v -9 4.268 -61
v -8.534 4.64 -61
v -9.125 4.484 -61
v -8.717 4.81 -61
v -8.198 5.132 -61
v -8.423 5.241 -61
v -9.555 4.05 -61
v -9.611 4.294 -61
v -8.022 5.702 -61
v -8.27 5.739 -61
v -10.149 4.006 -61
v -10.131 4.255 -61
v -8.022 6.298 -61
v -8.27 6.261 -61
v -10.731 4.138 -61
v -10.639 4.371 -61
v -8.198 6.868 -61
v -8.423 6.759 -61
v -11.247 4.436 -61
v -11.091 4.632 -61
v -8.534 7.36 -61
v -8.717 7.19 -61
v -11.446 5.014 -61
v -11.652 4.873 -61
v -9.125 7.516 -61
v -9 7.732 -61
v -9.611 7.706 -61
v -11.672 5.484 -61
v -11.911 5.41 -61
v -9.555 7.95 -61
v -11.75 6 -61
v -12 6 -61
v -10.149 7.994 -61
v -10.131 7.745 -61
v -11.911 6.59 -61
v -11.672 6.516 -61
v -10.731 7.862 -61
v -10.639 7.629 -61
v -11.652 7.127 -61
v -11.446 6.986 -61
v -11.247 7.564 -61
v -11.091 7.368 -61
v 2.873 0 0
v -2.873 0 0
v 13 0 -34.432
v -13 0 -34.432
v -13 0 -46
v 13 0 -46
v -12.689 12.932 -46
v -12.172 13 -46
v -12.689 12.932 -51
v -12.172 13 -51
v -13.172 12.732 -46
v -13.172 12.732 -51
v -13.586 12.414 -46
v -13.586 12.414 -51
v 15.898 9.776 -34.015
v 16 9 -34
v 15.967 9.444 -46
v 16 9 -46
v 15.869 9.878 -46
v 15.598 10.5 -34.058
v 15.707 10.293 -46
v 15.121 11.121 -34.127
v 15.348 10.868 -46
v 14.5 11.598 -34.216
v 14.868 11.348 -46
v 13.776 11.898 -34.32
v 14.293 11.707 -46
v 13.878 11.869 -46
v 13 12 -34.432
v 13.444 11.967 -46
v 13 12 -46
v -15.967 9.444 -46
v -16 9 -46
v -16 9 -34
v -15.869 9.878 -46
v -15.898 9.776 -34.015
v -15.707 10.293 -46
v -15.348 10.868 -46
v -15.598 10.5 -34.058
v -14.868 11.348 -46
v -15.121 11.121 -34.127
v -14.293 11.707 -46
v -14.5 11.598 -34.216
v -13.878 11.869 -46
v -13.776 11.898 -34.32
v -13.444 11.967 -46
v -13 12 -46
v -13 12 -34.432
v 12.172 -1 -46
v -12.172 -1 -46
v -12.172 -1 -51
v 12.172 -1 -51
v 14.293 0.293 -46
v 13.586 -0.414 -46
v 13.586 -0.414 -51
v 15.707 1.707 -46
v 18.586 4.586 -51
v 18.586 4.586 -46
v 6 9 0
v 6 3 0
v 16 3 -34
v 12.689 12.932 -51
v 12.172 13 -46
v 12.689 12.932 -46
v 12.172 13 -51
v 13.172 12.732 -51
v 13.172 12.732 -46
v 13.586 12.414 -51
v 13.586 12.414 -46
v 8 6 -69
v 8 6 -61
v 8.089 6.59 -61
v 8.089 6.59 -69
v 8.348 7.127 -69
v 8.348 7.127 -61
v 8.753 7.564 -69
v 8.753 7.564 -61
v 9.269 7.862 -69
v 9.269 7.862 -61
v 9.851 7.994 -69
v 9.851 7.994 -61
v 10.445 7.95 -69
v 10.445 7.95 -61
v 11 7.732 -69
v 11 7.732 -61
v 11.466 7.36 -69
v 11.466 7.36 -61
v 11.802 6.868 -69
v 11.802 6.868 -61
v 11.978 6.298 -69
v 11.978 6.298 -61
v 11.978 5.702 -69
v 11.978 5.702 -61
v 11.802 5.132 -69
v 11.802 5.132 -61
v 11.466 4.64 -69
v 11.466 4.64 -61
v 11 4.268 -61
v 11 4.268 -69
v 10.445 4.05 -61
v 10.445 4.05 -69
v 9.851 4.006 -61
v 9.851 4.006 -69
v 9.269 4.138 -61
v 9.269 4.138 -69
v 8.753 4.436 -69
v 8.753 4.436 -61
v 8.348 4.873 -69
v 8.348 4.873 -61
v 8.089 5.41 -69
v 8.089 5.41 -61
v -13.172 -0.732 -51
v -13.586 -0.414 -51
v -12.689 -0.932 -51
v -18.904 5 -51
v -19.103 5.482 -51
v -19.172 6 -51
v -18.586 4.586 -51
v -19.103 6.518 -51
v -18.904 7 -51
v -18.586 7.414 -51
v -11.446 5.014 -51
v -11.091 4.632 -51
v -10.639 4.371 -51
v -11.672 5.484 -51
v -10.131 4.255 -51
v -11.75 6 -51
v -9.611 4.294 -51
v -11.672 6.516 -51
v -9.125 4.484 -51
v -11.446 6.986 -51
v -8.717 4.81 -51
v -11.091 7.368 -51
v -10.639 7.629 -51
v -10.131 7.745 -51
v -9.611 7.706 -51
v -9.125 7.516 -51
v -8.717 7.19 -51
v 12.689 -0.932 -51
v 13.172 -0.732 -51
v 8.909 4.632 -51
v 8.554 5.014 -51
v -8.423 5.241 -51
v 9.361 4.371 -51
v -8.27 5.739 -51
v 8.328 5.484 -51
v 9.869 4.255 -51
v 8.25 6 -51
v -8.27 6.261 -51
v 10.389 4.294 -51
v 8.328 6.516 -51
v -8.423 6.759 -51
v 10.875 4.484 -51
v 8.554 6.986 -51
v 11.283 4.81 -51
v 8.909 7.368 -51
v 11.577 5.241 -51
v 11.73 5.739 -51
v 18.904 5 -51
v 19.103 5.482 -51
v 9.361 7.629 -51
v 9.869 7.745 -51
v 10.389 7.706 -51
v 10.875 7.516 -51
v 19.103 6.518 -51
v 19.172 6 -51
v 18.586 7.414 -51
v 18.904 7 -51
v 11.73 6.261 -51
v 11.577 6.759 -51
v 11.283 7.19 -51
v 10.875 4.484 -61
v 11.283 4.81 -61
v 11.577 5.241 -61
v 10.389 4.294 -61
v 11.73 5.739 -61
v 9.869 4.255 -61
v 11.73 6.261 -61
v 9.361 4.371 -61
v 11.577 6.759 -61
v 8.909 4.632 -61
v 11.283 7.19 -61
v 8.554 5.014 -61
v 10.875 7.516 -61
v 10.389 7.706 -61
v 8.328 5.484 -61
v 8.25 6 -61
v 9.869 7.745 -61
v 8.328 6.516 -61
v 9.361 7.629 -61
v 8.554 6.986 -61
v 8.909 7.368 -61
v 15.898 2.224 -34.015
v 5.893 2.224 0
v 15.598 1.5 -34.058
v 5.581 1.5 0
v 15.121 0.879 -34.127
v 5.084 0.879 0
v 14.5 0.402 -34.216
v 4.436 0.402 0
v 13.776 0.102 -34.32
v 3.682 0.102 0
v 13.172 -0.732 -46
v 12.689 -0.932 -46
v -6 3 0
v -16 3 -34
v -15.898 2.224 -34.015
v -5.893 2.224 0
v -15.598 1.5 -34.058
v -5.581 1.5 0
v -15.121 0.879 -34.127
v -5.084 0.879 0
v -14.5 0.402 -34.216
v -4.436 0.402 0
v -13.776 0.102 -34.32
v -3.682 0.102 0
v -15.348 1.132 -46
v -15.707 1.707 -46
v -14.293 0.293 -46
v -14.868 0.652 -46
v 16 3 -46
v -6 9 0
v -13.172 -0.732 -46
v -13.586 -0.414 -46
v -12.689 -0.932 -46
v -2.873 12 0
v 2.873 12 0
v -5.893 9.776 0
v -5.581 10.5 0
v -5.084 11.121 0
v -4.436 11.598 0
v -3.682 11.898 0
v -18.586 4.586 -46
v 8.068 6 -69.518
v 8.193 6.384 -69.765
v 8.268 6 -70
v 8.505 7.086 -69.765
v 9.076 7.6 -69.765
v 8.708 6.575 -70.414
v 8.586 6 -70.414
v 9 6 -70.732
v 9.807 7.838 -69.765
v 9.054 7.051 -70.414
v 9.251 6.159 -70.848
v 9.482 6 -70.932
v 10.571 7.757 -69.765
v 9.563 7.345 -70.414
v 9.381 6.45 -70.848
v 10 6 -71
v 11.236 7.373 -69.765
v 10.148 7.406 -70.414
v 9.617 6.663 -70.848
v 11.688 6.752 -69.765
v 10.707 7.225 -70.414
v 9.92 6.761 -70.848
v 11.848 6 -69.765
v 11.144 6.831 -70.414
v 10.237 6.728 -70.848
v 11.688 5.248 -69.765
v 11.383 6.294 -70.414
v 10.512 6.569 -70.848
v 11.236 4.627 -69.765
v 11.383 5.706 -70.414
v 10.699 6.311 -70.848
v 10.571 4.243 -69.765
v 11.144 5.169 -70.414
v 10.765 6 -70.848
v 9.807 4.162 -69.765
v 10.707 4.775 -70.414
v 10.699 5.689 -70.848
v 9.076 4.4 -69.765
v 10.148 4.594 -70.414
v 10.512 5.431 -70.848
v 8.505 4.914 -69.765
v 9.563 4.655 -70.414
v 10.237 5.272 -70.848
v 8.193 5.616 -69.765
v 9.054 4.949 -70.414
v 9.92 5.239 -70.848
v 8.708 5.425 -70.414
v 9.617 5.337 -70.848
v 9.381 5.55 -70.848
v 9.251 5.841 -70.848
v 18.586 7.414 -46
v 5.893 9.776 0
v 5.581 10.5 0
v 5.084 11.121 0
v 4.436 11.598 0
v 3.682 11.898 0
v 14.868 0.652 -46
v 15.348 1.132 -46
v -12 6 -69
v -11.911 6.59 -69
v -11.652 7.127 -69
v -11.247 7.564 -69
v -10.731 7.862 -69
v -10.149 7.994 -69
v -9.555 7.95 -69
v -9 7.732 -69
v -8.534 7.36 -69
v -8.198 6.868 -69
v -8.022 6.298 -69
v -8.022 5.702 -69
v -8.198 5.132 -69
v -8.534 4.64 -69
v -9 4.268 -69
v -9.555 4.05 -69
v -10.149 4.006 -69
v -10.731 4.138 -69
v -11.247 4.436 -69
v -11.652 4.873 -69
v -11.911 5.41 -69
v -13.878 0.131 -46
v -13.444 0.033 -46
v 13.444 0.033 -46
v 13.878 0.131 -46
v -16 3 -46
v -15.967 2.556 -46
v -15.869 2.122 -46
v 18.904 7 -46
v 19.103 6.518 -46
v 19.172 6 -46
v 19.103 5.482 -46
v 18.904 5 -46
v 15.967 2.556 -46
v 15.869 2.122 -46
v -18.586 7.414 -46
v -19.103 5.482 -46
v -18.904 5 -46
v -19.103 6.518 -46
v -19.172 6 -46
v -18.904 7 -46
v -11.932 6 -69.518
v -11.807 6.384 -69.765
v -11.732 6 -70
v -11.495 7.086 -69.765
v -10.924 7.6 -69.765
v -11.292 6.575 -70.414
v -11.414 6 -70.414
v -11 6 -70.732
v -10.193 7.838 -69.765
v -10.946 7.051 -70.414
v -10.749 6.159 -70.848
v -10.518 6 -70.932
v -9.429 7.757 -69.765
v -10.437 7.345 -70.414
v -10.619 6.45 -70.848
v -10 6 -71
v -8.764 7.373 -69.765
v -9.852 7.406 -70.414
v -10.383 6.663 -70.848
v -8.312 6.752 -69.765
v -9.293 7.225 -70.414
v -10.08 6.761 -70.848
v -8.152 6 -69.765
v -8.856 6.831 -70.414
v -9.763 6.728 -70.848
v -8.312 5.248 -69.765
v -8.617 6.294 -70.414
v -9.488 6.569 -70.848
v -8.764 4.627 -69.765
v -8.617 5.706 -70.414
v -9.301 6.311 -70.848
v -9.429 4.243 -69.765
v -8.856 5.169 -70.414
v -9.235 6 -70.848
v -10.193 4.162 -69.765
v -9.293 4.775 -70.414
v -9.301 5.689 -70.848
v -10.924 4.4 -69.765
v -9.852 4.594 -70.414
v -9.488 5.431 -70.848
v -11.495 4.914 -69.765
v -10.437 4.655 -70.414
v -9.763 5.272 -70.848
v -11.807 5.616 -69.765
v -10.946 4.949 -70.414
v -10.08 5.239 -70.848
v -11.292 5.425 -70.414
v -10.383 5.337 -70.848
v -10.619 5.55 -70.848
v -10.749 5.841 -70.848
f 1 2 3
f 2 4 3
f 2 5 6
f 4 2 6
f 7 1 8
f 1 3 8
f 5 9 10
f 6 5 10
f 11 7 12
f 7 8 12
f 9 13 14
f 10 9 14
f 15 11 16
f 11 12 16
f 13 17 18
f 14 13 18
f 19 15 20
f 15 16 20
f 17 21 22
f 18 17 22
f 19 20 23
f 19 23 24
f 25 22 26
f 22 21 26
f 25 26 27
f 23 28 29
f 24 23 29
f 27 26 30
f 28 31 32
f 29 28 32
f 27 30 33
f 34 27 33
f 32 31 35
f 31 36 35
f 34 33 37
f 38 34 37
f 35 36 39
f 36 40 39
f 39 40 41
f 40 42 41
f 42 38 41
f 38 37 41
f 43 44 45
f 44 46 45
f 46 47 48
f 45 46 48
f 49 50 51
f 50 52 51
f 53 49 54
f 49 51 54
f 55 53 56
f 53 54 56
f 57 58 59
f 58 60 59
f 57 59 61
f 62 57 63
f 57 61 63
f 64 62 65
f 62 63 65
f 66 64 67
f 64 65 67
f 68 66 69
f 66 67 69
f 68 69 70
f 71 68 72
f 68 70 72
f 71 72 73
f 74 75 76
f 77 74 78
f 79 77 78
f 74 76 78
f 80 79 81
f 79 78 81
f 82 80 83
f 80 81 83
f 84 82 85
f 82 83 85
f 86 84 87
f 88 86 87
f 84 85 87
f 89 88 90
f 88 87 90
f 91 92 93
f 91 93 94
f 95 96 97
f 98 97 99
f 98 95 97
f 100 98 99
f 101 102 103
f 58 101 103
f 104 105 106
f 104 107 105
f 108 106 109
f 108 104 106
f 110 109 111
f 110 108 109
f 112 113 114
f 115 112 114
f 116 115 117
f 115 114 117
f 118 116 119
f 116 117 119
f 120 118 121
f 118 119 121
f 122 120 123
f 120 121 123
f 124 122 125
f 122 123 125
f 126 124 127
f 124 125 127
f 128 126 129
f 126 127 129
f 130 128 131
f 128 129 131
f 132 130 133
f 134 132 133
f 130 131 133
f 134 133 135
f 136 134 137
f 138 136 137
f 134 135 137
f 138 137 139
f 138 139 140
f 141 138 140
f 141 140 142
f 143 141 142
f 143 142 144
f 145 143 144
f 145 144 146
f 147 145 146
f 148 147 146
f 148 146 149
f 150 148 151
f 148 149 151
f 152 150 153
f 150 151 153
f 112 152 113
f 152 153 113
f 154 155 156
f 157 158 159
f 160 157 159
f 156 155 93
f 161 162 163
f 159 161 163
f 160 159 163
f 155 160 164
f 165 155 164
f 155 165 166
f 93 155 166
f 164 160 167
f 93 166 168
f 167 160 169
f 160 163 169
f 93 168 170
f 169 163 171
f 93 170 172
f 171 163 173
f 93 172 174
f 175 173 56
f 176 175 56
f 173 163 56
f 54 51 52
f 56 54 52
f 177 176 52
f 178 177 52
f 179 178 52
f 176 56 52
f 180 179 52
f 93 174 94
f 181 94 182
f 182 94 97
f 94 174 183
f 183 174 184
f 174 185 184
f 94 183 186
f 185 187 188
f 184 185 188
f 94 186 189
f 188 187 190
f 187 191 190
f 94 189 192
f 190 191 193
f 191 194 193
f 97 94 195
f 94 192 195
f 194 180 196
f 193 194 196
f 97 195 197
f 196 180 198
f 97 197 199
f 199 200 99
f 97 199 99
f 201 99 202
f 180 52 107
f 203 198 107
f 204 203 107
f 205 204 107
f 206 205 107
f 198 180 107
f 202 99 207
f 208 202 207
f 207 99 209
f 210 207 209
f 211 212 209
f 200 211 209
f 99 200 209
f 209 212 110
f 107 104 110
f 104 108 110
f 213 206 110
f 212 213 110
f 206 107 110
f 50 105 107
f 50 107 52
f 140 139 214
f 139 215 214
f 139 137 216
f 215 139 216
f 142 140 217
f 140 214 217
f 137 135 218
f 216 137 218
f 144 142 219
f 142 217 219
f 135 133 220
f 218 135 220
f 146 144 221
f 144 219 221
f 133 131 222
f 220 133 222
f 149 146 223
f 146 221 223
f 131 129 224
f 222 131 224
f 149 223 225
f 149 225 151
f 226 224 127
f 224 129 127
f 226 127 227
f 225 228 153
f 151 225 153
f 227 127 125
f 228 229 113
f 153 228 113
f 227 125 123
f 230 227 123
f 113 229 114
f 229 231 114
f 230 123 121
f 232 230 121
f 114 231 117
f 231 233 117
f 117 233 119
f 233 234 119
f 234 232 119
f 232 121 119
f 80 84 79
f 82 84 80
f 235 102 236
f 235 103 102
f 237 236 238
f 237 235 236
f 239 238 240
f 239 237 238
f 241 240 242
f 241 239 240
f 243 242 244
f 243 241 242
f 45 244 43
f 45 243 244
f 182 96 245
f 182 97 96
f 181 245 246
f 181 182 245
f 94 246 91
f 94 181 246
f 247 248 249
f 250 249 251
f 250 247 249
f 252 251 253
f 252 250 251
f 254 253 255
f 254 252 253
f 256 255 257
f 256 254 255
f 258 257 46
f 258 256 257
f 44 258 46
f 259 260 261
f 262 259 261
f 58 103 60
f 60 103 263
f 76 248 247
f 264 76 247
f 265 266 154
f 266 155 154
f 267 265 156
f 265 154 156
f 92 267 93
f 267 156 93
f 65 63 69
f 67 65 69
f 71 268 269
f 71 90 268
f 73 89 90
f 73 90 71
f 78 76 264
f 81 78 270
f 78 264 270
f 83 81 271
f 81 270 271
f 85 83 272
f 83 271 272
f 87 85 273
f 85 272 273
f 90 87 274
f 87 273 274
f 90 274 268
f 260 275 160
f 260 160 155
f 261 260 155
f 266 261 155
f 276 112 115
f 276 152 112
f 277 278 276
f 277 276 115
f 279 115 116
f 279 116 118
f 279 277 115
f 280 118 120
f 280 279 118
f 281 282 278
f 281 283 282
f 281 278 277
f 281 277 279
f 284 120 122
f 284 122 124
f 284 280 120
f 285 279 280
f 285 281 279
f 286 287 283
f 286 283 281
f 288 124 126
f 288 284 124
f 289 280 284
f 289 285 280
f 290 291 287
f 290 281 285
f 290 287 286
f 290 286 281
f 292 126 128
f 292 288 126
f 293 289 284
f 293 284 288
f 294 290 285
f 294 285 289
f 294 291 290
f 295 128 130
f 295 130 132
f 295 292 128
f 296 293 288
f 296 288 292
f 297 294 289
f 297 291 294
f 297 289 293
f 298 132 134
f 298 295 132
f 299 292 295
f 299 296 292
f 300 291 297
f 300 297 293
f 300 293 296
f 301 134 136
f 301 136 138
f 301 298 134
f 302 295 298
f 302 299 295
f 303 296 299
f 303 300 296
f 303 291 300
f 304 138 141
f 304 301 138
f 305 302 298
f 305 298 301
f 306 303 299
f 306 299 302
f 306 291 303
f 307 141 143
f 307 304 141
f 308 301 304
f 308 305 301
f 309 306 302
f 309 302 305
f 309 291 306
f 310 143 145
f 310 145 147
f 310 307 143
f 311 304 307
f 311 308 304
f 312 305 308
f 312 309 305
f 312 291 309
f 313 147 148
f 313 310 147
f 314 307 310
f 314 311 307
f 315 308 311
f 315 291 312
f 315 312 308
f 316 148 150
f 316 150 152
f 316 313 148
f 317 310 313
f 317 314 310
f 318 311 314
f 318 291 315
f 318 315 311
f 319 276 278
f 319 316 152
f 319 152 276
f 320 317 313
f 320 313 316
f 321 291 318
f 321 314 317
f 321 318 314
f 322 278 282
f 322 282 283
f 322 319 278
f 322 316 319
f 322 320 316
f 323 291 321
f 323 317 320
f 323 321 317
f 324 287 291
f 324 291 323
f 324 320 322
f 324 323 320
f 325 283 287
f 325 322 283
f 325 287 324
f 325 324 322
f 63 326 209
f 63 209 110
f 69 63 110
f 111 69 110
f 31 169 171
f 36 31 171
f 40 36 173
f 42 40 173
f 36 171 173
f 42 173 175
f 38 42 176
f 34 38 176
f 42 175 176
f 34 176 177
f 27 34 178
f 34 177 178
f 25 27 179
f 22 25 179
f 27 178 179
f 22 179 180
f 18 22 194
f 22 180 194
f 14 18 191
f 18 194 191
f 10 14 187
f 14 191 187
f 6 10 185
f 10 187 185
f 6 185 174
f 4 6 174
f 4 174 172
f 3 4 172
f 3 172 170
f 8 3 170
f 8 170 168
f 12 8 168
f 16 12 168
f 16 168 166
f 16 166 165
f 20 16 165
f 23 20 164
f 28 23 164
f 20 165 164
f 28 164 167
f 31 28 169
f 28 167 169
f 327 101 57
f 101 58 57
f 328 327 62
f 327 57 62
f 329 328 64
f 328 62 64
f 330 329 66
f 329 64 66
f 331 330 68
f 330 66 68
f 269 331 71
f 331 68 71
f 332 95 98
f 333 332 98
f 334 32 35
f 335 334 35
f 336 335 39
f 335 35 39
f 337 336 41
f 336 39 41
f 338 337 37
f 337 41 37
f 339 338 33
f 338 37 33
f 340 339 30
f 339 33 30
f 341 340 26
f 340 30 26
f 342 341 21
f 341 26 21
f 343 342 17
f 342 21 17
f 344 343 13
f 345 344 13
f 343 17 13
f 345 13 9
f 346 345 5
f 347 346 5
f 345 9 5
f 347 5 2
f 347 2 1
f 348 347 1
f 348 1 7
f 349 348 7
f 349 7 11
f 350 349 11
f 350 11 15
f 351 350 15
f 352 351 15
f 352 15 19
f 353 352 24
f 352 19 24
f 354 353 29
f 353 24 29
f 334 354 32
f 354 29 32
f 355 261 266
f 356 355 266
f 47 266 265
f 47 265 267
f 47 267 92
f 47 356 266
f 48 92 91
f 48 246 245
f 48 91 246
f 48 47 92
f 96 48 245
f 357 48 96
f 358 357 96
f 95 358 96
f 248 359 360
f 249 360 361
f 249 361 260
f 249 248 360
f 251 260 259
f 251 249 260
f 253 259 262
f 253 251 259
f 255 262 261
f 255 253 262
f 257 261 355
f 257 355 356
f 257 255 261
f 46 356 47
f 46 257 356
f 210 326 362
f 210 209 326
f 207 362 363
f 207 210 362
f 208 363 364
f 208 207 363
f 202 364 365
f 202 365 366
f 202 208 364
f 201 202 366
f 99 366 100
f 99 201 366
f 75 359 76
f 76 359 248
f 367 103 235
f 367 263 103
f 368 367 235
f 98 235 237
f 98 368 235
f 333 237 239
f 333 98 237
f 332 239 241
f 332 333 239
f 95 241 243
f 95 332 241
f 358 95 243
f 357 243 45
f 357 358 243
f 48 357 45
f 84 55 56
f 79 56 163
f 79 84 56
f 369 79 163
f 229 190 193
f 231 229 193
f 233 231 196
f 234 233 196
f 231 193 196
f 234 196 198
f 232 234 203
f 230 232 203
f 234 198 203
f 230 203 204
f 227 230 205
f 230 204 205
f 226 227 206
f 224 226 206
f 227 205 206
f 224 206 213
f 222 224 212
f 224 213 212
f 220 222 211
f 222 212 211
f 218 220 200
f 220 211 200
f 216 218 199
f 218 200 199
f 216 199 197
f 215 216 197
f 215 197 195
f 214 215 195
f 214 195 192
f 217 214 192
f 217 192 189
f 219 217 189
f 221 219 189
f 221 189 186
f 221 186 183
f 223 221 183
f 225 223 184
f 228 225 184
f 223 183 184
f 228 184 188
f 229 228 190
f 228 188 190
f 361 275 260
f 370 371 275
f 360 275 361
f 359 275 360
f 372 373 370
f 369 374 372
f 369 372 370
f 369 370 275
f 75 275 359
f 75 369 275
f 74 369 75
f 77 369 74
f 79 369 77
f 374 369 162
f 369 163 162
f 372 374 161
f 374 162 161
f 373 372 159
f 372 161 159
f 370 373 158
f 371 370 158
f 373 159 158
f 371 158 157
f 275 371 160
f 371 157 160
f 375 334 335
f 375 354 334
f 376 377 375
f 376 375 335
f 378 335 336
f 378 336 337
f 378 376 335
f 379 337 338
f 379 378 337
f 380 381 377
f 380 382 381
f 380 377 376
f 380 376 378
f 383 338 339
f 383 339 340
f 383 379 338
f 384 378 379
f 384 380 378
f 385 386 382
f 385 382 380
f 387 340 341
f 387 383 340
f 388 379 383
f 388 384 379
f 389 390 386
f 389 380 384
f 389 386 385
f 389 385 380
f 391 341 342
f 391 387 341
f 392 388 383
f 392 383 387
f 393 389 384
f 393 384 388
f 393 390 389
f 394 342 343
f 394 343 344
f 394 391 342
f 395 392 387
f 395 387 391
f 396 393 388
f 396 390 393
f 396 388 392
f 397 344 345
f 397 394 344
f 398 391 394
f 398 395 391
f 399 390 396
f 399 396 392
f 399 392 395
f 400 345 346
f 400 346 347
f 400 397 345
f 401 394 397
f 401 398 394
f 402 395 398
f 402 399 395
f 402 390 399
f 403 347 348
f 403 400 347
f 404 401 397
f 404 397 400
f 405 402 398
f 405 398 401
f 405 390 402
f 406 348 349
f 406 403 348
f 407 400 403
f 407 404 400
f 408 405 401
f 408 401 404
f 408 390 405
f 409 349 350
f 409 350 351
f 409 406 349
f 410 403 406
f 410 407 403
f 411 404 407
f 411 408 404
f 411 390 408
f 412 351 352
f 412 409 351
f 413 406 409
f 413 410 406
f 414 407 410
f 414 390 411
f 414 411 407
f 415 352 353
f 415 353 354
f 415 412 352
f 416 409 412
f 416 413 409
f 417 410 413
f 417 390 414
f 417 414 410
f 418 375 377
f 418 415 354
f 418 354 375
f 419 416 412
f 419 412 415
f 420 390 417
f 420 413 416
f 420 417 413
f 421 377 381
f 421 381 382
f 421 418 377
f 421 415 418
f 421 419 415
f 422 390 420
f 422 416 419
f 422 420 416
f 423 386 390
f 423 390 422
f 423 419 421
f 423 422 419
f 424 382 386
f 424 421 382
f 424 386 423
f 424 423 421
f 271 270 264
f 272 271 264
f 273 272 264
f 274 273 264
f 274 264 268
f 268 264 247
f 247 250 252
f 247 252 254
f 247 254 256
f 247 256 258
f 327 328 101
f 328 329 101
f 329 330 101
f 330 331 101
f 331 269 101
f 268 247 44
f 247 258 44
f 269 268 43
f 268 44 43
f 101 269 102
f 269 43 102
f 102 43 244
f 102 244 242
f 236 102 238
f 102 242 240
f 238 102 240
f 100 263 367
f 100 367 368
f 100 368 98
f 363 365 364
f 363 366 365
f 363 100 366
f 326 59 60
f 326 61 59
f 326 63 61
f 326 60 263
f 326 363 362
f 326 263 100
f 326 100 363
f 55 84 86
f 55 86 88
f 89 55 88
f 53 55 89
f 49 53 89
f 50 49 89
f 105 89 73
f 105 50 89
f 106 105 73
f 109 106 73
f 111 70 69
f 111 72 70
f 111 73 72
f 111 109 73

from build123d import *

# Parameters (mm, degrees)
BOSS_EXTRUDE1_DEPTH = 12
FILLET1_R           = 3
BOSS_EXTRUDE2_DEPTH = 5
FILLET2_R           = 2
SKETCH4_R           = 1.75
BOSS_EXTRUDE3_DEPTH = 10
SKETCH5_R           = 2
BOSS_EXTRUDE4_DEPTH = 10
FILLET3_R           = 2


with BuildPart() as part:
    # Sketch1 → Boss-Extrude1 (new body)
    with BuildSketch(Plane(origin=(0, 0, 0), x_dir=(1, 0, 0), z_dir=(0, 1, 0))):
        Polygon((-6, 0), (6, 0), (11, 17), (16, 34), (16, 46), (-16, 46), (-16, 34), (-11, 17), align=None)
    extrude(amount=BOSS_EXTRUDE1_DEPTH)

    # Fillet1
    fillet1_edges = [part.edges().sort_by_distance(p)[0] for p in [
        (11, 12, -17),
        (16, 12, -40),
        (-16, 12, -40),
        (-11, 12, -17),
        (-11, 0, -17),
        (-16, 0, -40),
        (16, 0, -40),
        (11, 0, -17),
    ]]
    fillet(fillet1_edges, radius=FILLET1_R)

    # Sketch3 → Boss-Extrude2 (add)
    with BuildSketch(Plane(origin=(0, 0, -46), x_dir=(-1, 0, 0), z_dir=(0, 0, -1))):
        Polygon((-13, 13), (13, 13), (20, 6), (13, -1), (-13, -1), (-20, 6), align=None)
    extrude(amount=BOSS_EXTRUDE2_DEPTH)

    # Fillet2
    fillet2_edges = [part.edges().sort_by_distance(p)[0] for p in [
        (13, 13, -48.5),
        (20, 6, -48.5),
        (13, -1, -48.5),
        (-13, -1, -48.5),
        (-20, 6, -48.5),
        (-13, 13, -48.5),
    ]]
    fillet(fillet2_edges, radius=FILLET2_R)

    # Sketch4 → Boss-Extrude3 (add)
    with BuildSketch(Plane(origin=(0, 0, -51), x_dir=(-1, 0, 0), z_dir=(0, 0, -1))):
        with Locations((-10, 6)):
            Circle(SKETCH4_R)
        with Locations((10, 6)):
            Circle(SKETCH4_R)
    extrude(amount=BOSS_EXTRUDE3_DEPTH)

    # Sketch5 → Boss-Extrude4 (add)
    with BuildSketch(Plane(origin=(0, 0, -61), x_dir=(-1, 0, 0), z_dir=(0, 0, -1))):
        with Locations((10, 6)):
            Circle(SKETCH5_R)
        with Locations((-10, 6)):
            Circle(SKETCH5_R)
    extrude(amount=BOSS_EXTRUDE4_DEPTH)

    # Fillet3
    fillet3_edges = [part.edges().sort_by_distance(p)[0] for p in [
        (-8, 6, -71),
        (12, 6, -71),
    ]]
    fillet(fillet3_edges, radius=FILLET3_R)


solid = part.part
